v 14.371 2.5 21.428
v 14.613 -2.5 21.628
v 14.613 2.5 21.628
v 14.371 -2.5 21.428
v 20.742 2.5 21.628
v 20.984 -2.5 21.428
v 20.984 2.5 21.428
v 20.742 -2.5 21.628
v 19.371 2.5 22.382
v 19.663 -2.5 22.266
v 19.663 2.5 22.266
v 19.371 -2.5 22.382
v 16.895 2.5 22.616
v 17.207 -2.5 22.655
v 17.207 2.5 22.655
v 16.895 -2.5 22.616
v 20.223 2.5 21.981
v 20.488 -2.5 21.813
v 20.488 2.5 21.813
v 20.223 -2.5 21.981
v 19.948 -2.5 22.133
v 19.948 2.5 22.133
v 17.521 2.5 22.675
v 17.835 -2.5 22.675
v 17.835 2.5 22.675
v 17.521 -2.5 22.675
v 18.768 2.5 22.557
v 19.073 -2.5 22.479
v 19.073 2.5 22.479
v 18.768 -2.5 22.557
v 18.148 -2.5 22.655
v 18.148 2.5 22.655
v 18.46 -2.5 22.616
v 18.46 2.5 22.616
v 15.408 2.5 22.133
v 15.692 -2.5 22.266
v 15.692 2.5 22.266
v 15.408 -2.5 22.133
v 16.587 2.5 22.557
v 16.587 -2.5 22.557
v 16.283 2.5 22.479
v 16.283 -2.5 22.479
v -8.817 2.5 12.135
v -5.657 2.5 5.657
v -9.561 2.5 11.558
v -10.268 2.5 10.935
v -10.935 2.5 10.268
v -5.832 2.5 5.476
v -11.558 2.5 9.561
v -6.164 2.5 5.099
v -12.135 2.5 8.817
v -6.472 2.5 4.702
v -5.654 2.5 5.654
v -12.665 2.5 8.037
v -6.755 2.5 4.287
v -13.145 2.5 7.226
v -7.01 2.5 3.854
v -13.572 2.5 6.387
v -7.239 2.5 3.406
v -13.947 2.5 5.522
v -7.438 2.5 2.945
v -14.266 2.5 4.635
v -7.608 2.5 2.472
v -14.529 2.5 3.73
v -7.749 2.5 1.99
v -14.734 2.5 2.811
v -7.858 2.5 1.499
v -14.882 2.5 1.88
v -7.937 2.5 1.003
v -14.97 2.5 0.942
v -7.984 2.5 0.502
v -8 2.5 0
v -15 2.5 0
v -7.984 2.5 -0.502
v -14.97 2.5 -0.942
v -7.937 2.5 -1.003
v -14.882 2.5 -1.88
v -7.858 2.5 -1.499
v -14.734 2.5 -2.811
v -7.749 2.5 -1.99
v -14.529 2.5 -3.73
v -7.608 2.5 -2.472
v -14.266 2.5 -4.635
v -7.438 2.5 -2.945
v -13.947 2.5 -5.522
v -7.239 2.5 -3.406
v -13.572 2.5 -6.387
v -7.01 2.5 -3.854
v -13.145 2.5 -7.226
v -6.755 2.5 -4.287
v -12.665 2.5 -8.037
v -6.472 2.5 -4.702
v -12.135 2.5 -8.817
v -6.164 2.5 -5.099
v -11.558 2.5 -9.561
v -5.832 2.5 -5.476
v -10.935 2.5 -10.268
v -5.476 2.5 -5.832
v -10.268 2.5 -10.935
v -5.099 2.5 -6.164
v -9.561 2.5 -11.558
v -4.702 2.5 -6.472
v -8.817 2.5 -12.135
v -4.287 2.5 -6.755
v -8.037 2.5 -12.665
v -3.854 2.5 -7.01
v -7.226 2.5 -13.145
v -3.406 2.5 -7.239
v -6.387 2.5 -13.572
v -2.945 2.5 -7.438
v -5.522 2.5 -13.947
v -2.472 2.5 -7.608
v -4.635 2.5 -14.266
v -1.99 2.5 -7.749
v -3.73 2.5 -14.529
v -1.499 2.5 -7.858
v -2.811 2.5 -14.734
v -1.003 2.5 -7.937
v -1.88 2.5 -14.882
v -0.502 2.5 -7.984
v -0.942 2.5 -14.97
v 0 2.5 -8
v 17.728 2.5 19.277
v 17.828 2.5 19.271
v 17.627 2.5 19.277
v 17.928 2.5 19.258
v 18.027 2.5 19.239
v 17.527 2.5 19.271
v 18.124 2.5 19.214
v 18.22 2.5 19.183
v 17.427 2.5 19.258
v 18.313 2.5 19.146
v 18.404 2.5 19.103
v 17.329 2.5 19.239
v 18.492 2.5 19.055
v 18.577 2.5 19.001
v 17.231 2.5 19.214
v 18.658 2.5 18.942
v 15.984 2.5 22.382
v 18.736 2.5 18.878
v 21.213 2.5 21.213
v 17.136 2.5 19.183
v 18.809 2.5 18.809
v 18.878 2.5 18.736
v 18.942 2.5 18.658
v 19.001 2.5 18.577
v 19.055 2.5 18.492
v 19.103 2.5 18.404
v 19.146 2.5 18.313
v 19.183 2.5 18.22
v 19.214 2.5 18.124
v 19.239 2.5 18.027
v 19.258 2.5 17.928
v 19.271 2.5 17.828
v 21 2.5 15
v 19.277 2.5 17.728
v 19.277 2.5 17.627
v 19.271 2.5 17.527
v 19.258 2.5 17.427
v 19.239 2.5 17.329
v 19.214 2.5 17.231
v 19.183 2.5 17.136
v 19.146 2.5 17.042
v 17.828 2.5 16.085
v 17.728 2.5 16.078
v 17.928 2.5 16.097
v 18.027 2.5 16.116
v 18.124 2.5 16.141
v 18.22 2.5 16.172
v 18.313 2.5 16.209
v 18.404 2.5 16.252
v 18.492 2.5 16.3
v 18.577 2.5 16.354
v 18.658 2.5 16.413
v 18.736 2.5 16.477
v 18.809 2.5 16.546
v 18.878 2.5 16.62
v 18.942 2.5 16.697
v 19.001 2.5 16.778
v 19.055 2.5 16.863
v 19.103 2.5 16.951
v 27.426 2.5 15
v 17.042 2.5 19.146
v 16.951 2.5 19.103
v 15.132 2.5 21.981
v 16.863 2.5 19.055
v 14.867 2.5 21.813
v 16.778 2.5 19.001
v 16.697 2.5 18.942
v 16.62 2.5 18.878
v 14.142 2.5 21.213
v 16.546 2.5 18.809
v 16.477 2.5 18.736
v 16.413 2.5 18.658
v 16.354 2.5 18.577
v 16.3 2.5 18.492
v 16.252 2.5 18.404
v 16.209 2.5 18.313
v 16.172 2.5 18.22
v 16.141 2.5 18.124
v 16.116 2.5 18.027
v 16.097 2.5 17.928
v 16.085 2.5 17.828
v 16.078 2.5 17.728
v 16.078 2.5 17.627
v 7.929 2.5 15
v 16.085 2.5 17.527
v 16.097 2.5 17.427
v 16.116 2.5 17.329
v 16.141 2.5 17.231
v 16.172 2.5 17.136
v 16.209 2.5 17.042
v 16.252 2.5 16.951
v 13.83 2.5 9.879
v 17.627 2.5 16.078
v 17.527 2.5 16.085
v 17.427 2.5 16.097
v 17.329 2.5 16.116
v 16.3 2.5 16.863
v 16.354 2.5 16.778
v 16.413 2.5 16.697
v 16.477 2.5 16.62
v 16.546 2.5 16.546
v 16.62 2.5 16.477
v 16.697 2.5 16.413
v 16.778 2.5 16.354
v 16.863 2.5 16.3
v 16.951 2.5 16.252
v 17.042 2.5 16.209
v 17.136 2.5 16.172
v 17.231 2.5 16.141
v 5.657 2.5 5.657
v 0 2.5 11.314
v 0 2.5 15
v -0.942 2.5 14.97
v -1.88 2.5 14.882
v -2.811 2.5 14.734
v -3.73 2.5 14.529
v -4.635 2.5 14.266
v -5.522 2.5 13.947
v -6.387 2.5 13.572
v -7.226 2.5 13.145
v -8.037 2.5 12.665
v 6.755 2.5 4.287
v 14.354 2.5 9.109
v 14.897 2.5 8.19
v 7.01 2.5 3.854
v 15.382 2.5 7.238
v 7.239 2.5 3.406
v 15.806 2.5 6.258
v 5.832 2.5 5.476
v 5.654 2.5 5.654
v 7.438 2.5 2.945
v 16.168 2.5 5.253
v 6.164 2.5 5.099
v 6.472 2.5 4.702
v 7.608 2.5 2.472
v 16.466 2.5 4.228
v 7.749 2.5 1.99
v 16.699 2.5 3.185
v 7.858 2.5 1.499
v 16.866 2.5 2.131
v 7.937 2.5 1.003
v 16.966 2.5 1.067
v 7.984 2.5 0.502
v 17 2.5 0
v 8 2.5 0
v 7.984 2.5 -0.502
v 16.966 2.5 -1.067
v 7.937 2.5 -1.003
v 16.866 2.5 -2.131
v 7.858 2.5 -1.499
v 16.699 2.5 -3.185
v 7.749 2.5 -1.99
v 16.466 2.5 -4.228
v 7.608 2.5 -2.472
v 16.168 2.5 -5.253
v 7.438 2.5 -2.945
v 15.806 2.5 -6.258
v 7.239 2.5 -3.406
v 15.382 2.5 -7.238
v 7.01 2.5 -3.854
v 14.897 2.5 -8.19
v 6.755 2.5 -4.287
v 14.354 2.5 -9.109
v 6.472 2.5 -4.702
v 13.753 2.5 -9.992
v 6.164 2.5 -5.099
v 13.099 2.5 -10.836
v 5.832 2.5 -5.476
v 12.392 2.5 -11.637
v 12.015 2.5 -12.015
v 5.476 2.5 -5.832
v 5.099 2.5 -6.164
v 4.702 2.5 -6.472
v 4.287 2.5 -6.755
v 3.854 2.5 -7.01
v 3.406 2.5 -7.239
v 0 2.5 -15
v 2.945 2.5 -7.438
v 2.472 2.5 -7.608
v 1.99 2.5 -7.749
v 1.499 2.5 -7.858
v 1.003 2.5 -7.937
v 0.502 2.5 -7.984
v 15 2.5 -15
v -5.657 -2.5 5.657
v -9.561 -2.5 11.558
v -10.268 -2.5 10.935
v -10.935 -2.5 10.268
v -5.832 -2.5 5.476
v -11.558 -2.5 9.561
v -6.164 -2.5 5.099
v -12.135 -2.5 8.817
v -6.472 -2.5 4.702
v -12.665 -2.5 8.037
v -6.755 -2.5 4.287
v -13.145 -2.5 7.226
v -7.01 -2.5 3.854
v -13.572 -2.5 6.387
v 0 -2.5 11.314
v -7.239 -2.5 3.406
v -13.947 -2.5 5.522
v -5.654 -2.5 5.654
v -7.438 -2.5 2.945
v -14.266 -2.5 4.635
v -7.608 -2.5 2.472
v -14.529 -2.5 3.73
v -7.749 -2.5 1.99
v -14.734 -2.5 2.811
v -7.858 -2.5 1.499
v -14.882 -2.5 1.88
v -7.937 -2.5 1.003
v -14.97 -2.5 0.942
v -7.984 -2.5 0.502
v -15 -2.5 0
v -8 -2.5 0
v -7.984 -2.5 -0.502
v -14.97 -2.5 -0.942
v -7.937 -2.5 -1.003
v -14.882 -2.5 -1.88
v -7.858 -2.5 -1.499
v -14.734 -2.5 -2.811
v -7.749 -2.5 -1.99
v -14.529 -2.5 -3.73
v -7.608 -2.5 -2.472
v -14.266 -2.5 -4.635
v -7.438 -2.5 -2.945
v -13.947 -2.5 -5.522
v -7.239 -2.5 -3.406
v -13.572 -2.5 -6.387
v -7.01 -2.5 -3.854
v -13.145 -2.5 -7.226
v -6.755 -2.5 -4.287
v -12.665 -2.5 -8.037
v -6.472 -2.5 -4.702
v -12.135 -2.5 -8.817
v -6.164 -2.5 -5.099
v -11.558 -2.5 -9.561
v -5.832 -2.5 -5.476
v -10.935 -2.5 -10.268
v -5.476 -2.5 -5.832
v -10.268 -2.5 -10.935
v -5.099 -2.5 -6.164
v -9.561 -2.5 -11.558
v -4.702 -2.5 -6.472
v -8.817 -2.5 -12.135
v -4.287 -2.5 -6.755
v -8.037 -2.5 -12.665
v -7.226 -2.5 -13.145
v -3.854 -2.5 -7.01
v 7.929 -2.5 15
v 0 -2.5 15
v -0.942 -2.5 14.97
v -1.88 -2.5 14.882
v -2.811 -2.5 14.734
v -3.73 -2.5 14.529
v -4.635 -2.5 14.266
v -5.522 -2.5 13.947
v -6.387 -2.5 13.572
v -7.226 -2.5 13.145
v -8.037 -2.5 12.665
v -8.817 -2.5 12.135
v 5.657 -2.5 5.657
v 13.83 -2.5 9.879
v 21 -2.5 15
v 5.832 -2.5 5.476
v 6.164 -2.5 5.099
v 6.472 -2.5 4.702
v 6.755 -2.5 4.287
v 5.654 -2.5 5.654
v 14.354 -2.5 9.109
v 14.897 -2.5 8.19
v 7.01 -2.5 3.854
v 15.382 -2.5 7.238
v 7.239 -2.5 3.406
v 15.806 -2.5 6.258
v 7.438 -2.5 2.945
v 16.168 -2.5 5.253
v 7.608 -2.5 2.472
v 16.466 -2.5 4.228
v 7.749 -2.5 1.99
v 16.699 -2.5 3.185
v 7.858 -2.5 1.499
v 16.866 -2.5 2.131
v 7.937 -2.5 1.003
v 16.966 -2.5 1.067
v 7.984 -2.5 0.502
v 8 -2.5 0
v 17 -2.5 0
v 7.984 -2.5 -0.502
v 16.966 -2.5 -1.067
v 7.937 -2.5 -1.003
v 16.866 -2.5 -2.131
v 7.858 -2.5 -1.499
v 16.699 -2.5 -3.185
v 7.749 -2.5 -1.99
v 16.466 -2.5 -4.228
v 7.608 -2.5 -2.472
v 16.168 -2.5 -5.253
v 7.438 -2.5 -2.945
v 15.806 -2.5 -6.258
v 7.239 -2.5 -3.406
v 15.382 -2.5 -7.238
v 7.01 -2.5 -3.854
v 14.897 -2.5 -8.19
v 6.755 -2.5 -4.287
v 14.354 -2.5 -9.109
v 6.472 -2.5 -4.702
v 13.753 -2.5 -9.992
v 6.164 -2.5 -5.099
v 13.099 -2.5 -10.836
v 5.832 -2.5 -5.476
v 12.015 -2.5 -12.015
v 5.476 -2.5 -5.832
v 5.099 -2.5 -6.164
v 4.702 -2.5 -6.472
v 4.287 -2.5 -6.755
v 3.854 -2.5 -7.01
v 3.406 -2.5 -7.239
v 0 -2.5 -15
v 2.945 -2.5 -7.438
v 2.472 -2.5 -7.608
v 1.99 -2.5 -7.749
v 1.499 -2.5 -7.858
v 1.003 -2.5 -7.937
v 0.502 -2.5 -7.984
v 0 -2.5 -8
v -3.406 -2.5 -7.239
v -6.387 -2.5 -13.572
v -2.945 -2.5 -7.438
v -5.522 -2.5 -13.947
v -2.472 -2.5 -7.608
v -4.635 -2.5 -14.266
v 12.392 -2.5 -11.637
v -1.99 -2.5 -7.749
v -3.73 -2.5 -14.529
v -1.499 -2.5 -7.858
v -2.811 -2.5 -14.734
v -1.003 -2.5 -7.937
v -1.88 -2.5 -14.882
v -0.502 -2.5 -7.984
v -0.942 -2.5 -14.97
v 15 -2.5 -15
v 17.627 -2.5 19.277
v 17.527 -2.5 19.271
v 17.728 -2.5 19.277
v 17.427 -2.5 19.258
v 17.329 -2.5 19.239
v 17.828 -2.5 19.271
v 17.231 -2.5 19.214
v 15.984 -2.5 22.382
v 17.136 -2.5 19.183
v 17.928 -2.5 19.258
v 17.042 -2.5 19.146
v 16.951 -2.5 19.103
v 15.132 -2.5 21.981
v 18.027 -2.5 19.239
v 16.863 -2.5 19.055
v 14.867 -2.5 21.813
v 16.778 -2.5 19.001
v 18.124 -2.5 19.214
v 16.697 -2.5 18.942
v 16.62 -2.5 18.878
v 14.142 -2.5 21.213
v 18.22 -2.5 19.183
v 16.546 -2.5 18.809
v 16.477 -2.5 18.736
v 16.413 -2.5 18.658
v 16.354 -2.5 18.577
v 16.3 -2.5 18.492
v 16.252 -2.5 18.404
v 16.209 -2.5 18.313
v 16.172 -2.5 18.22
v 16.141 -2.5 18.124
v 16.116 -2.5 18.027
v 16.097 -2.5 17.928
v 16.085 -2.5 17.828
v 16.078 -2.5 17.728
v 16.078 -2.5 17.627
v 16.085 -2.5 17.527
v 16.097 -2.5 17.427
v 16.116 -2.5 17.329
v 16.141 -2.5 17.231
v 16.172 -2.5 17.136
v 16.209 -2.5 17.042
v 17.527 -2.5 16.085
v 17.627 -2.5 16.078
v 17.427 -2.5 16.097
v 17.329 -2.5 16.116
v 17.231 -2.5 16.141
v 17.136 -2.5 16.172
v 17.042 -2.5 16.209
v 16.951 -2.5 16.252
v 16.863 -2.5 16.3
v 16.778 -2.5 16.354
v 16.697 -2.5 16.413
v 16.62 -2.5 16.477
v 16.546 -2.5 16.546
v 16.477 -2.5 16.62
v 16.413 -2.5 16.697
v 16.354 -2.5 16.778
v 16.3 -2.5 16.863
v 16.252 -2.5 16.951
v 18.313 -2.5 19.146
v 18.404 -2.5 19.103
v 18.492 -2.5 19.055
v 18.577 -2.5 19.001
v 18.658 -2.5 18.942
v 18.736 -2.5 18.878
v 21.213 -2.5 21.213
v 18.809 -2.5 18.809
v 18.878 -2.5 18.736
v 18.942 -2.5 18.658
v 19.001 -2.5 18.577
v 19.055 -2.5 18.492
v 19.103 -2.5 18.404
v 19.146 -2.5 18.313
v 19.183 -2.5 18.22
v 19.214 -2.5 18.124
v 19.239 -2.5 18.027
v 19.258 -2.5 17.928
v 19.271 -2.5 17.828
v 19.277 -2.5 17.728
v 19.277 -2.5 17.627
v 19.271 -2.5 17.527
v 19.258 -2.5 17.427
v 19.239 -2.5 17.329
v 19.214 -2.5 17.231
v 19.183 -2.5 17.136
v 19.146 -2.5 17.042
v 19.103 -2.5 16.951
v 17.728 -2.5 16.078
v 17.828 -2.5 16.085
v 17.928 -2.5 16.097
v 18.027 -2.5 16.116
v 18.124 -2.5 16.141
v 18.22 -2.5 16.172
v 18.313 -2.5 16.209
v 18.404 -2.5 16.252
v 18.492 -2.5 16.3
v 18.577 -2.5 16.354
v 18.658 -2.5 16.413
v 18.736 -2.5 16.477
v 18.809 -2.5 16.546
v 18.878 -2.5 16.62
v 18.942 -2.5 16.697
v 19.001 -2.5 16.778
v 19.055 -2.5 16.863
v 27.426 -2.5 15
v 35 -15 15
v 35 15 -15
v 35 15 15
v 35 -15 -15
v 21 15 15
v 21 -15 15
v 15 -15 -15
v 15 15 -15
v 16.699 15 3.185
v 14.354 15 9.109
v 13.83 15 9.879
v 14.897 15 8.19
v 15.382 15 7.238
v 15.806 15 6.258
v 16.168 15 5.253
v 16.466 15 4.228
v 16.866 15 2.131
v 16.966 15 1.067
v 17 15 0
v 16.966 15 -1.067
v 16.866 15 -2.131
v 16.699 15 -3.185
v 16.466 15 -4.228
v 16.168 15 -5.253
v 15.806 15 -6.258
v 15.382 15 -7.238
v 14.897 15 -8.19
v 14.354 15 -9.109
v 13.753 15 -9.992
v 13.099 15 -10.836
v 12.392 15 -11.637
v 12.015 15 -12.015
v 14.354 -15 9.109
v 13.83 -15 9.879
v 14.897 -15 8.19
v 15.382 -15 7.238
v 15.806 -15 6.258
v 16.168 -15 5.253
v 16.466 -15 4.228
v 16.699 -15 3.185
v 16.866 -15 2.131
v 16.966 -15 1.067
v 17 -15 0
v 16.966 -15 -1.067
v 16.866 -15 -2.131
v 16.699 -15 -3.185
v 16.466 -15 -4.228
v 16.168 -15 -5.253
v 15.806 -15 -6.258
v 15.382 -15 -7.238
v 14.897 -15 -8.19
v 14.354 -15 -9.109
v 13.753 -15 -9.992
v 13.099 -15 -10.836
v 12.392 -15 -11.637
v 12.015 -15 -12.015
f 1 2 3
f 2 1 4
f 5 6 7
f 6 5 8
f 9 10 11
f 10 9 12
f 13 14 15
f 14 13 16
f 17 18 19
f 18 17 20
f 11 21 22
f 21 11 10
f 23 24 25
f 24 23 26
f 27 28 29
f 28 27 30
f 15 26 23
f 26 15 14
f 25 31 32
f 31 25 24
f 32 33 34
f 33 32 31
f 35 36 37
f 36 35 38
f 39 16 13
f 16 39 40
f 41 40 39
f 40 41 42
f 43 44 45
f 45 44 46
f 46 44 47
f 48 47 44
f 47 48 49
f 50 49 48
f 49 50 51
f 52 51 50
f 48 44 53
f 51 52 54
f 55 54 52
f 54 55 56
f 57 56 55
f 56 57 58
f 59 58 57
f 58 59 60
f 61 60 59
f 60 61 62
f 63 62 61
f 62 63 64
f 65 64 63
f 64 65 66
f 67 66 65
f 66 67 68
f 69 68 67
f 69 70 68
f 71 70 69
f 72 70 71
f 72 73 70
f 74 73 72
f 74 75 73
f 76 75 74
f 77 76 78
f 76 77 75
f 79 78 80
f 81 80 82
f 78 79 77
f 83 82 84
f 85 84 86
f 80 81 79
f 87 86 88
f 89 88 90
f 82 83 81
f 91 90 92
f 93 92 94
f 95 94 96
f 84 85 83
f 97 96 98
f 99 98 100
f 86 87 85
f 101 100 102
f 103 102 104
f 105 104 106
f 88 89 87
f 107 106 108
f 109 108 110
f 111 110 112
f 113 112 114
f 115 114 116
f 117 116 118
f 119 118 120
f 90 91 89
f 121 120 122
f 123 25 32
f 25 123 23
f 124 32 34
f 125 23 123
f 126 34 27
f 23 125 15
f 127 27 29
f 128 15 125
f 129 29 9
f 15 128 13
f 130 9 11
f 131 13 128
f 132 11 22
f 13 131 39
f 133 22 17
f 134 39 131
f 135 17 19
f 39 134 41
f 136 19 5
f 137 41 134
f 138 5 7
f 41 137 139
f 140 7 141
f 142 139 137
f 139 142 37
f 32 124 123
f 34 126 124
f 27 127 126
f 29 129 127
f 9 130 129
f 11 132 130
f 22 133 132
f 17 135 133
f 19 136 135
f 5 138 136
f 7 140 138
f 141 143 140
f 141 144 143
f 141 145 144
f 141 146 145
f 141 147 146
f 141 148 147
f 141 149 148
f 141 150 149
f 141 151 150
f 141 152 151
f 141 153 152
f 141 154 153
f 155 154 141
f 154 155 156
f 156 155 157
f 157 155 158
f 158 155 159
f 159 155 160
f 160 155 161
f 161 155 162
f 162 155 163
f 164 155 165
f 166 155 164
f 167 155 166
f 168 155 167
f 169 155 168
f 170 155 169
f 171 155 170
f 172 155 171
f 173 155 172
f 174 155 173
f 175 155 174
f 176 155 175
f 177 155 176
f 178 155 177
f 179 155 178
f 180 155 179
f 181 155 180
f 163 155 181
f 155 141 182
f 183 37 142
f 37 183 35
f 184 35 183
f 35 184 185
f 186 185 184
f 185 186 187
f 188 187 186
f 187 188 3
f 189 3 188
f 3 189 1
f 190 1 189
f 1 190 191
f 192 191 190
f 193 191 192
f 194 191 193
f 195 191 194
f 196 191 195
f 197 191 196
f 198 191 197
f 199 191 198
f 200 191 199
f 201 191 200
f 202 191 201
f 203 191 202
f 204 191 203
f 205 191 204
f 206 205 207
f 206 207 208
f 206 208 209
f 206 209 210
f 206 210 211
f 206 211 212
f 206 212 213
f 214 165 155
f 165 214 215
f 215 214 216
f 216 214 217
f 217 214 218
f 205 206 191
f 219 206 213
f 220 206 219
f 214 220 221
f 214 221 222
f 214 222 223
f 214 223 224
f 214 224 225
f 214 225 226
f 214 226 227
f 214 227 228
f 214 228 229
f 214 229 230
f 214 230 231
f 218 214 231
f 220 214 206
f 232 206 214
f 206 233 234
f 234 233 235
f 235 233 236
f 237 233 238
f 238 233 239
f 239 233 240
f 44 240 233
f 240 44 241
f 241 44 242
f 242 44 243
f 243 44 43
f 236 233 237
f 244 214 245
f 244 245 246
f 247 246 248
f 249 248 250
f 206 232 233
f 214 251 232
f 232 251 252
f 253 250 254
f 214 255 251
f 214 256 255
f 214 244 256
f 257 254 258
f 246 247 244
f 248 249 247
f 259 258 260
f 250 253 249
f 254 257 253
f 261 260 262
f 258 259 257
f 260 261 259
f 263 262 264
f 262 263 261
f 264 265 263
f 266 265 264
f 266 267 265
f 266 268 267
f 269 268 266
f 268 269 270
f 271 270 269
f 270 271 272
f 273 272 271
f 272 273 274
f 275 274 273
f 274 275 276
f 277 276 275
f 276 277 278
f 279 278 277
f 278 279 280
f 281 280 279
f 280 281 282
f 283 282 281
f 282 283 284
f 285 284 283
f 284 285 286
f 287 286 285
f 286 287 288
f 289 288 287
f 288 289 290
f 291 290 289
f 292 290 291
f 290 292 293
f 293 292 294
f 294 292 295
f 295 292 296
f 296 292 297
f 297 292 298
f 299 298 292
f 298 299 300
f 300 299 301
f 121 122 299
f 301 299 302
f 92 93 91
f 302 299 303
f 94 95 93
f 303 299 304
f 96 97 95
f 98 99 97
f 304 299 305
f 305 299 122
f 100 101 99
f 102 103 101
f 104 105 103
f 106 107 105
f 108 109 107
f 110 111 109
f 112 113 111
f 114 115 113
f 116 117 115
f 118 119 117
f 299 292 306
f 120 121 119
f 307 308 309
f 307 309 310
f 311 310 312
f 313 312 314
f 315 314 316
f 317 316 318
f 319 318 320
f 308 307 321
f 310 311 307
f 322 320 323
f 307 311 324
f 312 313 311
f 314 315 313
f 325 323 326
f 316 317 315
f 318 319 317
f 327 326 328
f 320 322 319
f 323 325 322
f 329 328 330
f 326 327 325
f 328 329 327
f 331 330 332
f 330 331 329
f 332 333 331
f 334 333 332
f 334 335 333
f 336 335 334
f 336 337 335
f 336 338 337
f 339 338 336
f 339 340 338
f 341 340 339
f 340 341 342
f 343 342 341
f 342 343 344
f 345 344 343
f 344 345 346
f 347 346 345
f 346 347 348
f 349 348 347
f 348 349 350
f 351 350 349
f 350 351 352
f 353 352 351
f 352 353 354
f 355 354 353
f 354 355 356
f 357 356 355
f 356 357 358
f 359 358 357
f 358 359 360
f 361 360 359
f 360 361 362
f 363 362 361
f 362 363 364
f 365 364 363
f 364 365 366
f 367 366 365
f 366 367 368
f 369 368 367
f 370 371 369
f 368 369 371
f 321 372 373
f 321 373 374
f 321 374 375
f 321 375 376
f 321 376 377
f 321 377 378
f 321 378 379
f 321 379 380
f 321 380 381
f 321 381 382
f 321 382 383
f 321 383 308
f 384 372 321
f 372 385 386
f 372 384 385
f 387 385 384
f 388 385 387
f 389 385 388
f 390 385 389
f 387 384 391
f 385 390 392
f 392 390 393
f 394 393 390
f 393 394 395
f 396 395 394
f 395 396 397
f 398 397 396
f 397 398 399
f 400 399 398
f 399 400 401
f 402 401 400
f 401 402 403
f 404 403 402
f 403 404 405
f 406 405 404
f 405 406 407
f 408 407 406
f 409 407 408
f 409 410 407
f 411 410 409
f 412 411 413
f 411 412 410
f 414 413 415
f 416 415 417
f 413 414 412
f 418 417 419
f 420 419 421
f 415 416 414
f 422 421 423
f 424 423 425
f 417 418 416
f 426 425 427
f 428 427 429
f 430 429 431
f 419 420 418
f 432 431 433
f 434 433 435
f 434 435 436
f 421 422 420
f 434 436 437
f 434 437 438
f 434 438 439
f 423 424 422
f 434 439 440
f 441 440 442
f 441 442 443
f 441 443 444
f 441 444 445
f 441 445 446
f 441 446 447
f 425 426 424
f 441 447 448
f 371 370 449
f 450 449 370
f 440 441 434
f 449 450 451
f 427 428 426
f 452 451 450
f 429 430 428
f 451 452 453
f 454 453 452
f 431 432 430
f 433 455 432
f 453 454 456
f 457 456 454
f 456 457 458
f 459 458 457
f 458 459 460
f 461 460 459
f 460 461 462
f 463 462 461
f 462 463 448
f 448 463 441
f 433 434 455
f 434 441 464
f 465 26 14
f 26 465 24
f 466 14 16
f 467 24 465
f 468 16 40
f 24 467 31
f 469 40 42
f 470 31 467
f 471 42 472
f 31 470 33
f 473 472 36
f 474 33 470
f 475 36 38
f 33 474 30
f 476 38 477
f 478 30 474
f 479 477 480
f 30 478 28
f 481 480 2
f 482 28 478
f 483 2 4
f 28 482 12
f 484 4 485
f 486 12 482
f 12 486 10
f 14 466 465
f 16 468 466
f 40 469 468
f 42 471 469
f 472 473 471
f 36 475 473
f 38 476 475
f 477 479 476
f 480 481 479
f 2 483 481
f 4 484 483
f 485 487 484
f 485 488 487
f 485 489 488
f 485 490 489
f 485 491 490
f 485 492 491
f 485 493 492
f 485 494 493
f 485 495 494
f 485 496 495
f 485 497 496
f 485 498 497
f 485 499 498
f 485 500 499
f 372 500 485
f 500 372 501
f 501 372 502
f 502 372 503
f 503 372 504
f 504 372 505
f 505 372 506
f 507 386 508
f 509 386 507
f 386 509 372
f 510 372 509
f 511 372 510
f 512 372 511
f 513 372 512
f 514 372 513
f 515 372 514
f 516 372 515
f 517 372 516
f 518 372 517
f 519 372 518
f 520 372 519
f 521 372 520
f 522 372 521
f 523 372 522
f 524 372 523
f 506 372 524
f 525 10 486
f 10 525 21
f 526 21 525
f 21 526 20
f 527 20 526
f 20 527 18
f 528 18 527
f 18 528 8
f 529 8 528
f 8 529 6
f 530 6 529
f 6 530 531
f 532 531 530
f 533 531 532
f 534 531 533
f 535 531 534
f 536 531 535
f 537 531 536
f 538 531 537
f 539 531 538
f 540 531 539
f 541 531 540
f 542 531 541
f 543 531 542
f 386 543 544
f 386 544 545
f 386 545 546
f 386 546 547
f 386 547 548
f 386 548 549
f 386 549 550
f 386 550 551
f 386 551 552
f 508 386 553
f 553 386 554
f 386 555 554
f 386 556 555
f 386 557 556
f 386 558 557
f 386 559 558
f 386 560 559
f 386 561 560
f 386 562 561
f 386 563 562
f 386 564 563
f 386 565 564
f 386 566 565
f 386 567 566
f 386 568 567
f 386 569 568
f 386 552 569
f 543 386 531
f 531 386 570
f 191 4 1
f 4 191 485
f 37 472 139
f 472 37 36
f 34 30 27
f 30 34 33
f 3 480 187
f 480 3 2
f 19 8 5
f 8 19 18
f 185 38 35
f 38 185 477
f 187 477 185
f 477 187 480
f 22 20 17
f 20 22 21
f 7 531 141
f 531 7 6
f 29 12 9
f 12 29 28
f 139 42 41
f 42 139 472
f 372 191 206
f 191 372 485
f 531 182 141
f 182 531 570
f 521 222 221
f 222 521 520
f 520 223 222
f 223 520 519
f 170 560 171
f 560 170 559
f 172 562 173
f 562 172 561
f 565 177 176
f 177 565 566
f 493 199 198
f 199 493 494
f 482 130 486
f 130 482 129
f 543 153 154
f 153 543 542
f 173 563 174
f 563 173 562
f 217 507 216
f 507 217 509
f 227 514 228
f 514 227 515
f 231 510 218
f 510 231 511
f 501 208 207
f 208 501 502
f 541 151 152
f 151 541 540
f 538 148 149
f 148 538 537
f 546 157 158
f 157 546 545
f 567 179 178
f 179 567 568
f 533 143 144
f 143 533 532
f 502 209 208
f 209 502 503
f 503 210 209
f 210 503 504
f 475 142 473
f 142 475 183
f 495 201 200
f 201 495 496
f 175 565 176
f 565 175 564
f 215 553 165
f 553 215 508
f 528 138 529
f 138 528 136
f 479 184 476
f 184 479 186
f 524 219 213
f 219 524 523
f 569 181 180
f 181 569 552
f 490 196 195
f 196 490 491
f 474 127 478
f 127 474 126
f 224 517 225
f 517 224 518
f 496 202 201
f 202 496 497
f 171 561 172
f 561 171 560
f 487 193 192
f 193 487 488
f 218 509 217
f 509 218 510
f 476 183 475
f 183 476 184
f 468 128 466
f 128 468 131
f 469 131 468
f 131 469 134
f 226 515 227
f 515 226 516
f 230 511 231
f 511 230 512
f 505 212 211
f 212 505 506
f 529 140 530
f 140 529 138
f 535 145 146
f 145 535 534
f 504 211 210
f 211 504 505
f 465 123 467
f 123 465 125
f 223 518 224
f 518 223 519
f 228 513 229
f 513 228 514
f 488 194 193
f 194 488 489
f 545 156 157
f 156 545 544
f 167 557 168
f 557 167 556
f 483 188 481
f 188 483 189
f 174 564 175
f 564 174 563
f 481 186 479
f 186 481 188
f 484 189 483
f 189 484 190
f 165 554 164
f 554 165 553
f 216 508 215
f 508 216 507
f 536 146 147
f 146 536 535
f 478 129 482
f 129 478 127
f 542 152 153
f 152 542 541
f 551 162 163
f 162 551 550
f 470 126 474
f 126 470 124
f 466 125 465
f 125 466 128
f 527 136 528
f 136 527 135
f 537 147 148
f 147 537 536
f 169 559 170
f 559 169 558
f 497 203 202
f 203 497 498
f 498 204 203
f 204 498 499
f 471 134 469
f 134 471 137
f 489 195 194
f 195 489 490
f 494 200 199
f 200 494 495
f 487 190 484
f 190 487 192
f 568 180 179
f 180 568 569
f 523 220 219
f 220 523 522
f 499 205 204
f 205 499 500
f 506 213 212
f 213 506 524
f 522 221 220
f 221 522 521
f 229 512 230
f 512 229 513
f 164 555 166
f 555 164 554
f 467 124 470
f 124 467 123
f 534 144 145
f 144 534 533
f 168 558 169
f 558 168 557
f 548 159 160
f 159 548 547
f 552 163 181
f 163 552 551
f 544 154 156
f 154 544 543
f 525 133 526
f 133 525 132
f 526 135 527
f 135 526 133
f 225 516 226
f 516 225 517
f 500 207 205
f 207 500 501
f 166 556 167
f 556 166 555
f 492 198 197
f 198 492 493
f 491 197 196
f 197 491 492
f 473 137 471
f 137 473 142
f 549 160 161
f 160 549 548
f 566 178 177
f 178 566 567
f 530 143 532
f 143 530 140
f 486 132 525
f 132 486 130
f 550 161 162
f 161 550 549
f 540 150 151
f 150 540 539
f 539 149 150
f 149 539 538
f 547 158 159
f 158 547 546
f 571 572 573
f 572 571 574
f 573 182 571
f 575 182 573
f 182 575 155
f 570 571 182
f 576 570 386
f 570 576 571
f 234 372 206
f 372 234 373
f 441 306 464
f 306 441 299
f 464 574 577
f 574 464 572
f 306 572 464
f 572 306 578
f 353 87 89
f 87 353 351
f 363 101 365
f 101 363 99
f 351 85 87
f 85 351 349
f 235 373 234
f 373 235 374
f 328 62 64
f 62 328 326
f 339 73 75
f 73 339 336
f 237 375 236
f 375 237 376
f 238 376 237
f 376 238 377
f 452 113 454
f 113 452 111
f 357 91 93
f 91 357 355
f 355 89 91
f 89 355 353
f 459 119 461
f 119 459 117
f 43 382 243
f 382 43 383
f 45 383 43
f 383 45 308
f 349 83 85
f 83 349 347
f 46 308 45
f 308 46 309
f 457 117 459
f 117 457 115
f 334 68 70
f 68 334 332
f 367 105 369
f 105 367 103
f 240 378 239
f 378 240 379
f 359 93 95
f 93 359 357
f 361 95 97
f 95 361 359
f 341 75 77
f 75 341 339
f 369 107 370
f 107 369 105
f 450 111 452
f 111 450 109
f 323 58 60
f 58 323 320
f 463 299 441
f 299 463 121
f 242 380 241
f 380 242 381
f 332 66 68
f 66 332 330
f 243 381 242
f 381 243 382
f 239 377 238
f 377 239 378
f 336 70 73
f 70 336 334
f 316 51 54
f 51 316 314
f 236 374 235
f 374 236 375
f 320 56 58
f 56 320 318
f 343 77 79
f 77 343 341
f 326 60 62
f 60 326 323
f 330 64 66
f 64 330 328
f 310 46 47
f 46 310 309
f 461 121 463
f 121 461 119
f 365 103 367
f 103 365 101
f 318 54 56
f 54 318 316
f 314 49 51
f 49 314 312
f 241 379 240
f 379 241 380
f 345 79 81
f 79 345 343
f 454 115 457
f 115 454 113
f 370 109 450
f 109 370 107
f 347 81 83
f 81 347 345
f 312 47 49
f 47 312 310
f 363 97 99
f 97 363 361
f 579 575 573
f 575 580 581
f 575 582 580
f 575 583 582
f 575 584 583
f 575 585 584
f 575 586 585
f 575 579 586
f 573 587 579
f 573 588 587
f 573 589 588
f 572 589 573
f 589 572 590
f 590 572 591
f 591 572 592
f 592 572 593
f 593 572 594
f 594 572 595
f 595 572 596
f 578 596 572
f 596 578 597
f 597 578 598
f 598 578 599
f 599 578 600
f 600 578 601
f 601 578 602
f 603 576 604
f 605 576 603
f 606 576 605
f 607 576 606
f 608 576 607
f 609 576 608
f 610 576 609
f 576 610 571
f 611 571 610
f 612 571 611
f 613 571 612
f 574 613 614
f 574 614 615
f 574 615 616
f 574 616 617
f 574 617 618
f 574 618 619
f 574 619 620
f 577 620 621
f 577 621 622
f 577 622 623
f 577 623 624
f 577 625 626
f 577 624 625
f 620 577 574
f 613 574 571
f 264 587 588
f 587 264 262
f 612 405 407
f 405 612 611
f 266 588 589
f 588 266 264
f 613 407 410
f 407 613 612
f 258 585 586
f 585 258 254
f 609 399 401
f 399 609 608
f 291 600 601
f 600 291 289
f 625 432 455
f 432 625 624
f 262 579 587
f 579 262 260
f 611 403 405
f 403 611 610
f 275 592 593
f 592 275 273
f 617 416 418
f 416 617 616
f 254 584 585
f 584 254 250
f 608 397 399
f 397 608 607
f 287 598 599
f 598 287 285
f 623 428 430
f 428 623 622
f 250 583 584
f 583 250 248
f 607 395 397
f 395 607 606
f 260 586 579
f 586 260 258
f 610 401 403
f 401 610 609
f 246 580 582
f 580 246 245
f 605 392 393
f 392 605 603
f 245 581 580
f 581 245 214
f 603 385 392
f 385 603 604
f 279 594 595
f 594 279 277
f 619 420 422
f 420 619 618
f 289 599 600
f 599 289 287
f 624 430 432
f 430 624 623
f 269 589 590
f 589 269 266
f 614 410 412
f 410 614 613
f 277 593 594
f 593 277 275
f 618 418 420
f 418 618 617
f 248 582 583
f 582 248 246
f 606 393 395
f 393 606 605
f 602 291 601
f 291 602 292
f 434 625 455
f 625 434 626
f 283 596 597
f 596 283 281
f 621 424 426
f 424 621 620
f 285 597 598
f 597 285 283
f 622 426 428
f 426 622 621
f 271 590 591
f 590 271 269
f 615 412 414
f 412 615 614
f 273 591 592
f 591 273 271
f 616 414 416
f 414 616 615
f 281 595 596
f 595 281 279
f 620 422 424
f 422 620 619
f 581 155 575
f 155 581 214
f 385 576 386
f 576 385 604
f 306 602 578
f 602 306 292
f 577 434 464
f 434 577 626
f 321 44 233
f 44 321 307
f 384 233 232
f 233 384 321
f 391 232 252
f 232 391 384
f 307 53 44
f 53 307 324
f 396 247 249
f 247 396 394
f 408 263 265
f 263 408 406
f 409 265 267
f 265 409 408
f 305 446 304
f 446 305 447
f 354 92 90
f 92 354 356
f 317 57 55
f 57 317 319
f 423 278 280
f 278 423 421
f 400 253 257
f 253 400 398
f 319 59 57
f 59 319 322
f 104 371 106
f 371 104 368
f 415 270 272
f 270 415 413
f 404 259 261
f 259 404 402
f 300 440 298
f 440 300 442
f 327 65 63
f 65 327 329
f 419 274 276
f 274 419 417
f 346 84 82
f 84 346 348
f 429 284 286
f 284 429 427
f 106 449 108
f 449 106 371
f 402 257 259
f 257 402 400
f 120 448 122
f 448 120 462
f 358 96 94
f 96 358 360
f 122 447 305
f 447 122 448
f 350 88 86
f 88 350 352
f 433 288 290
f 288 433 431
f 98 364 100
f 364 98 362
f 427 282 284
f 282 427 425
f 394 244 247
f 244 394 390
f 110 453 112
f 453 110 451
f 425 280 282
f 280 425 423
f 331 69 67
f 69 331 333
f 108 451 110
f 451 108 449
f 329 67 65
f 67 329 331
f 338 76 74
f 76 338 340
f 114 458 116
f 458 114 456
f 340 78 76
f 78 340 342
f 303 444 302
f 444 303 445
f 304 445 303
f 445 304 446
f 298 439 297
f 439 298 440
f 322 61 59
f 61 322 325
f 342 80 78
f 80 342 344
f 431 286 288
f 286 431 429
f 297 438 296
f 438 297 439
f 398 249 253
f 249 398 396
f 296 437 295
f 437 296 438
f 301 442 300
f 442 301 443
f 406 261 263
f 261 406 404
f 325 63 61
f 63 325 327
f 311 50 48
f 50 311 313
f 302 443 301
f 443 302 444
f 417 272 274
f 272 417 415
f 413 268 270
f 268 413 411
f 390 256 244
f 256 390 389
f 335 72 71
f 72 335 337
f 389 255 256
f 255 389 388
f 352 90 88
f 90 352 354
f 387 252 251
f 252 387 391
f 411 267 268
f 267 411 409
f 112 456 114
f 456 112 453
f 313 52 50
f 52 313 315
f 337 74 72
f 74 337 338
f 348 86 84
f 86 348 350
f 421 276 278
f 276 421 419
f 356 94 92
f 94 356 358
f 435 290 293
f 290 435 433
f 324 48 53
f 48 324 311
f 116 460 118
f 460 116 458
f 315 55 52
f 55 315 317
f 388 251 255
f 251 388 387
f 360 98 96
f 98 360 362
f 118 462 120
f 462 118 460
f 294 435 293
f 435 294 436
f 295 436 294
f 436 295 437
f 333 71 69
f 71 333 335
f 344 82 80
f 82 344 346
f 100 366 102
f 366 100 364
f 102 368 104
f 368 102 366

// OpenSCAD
lever_w = 10;
lever_l = 25;

bearing_d = 16;
shaft_d = 8;

screw_d = 3.2; 

$fn = 100;

// macros
module mirror2(v) {
    children();
    mirror(v) children();
}

// modules
module pull_rod (lenght = 180, width = 8, height = 3) {
    difference() {
        union() {
            cube([lenght, width, height], center = true);
            mirror2([1,0,0]) {
                translate([lenght / 2, 0, 0]) 
                    cylinder(h = height, d = width, center = true);
            }
        };
        mirror2([1,0,0]) {
            translate([lenght / 2, 0, 0]) 
                cylinder(h = height + 1, d = screw_d, center = true);
        }
    };
}

module pull_lever (angle = 90, lenght = 25, width = 8, height = 5) {
    module lever() {
		difference(){
			union() {
				translate([lenght / 2, 0, 0]) 
					cube([lenght, width, height], center = true);
				translate([lenght, 0, 0]) 
					cylinder(h = height, d = width, center = true);
			}
			translate([lenght, 0, 0]) 
				cylinder(h = height + 1, d = screw_d, center = true);
		}
	}

	center_diameter = 28;

    difference() {
        union() {
        	cylinder(h = height, d = center_diameter, center = true);

			lever();
			if(angle >= 15 || angle <= -15) {
				rotate([0,0,angle])
					lever();
			}
        };
        cylinder(h = height + 1, d = bearing_d, center = true);
	};
}

module motor_lever ( lenght = 25, width = 8, height = 3) {
    module lever() {
		cylinder(h = height, d = center_diameter, center = true);
		translate([lenght / 2, 0, 0]) 
			cube([lenght, width, height], center = true);
		translate([lenght, 0, 0]) 
			cylinder(h = height, d = width, center = true);
	}
	module holes() {
		difference() {
            cylinder(h = height + 1, d = hole, center = true);
			translate([hole - ofset,0,0])
				cube([hole, hole, height + 2], center = true);
			}
        translate([lenght, 0, 0]) 
			cylinder(h = height + 1, d = screw_d, center = true);
	}
	
	hole = 4;
    ofset = 0.5;
    center_diameter = 16;

    difference() {
        lever();
        holes();
    };
}

module spacer (height = 50, width = 6, hole = screw_d) {
	difference() {
		cylinder(h = height, d = width, center = true);
		cylinder(h = height + 1, d = hole, center = true);
	};
}

module arm_side (lenght = 180, width = 30, height = 5, angle = 0, narrowing = false, rounded = true) {
	module body() {
		cube([lenght, width, height], center = true);
			translate([lenght / 2, 0, 0]) 
				rotate([0,0,30]) 
					if(rounded) 
						cylinder(h = height, d = width, center = true);
					else 
						cylinder(h = height, d = width, center = true, $fn = 6);
					
			translate([-lenght / 2, 0, 0]) 
					cylinder(h = height, d = width, center = true);
	}
	
	module arm() {
		translate([-lenght / 2, 0, 0]) 
				rotate([0,0,angle])
					union(){
						translate([lever_l / 2, 0, 0]) 
							cube([lever_l, lever_w, height], center = true);
						translate([lever_l, 0, 0]) 
							cylinder(h = height, d = lever_w, center = true);
					};
	}

	module holes() {
		translate([lenght / 2, 0, 0]) 
					cylinder(h = height + 1, d = shaft_d, center = true);
			translate([-lenght / 2, 0, 0]) 
					cylinder(h = height + 1, d = bearing_d, center = true);
			translate([-lenght / 2, 0, 0]) 
				rotate([0,0,angle])
					translate([lever_l, 0, 0]) 
						cylinder(h = height + 1, d = screw_d, center = true);
			mirror2([1,0,0]) {
                translate([width / 2, 0, 0]) 
					cylinder(h = height + 1, d = screw_d, center = true);
			}
	}

	module side_cuts() {
		mirror2([0,1,0]) {
                linear_extrude(height = height + 1, center = true) {
                    polygon([[lenght/2 - 10, width/2+1], 
                            [-lenght/2 + 20, width/2+1],
                            [ -lenght/2 + 30, width/2 - 3],
                            [lenght/2 - 20, width/2 - 3]]);
                }
            }
	}

	translate([lenght / 2, 0, 0]) 
	difference() {
		union() {
			body();
			arm();
		};
		union(){
			holes();
			if(narrowing == true) { 
				side_cuts();
			}
		};	
	};
}

module end(lenght = 50, width = 30, center_w = 5, angle = 45) {
	module center() {
		translate([lenght / 2 - width / 4, 0, 0])
			cube([lenght - width / 2, center_w, width], center = true);
		rotate([90,0,0])
			cylinder(h = center_w, d = width, center = true);
		// pull rod attach point
		translate([0, 0, 0])
			difference() {
				rotate([-90,180-angle,0]) {
				
				// lever
					translate([-lever_l, 0, 0]) 
						cylinder(h = 5, d = lever_w, center = true);				
					// round lever end
					translate([-lever_l / 2, 0, 0]) 
						cube([lever_l, lever_w, 5], center = true);
					if(angle >= 45) {
						translate([(-lever_l - lever_w)  / 2, -5, 0]) 
							cube([lever_l, 10 , 5], center = true);
					}
				}
				rotate([-90,180-angle,0])
					translate([-lever_l, 0, 0]) 
						cylinder(h = 5 + 1, d = screw_d, center = true);	
			}
	}
	module sides() {
		difference() {
			translate([(lenght - width / 2 + 12) / 2, 0, 0])
				cube([lenght - width / 2 - 12, width, width], center = true);
			rotate([90,0,0])
				cylinder(h = width + 1, d = width + 4, center = true);
			rotate([90,0,0]) 
				linear_extrude(height = width + 1, center = true)
				polygon([[0,0],[28,20],[0,20]]);
			mirror([0,0,1])
				rotate([90,0,0]) 
				linear_extrude(height = width + 1, center = true)
				polygon([[0,0],[20,20],[0,20]]);
		}
	}
	module bearing_hole() {
		rotate([0,-45,0])
			translate([bearing_d / 4, 0, bearing_d / 4])
				cube([bearing_d / 2, center_w + 1, bearing_d / 2], center = true);
		rotate([90,0,0])
			cylinder(h = center_w + 1, d = bearing_d, center = true);
	}
	
	difference() {
		union() {
			center();
			sides();
		}
		union() {
			bearing_hole();
		}
	}
}


// testing
//pull_rod();
//pull_lever();
//motor_lever();
//spacer();
//arm_side();
end();
